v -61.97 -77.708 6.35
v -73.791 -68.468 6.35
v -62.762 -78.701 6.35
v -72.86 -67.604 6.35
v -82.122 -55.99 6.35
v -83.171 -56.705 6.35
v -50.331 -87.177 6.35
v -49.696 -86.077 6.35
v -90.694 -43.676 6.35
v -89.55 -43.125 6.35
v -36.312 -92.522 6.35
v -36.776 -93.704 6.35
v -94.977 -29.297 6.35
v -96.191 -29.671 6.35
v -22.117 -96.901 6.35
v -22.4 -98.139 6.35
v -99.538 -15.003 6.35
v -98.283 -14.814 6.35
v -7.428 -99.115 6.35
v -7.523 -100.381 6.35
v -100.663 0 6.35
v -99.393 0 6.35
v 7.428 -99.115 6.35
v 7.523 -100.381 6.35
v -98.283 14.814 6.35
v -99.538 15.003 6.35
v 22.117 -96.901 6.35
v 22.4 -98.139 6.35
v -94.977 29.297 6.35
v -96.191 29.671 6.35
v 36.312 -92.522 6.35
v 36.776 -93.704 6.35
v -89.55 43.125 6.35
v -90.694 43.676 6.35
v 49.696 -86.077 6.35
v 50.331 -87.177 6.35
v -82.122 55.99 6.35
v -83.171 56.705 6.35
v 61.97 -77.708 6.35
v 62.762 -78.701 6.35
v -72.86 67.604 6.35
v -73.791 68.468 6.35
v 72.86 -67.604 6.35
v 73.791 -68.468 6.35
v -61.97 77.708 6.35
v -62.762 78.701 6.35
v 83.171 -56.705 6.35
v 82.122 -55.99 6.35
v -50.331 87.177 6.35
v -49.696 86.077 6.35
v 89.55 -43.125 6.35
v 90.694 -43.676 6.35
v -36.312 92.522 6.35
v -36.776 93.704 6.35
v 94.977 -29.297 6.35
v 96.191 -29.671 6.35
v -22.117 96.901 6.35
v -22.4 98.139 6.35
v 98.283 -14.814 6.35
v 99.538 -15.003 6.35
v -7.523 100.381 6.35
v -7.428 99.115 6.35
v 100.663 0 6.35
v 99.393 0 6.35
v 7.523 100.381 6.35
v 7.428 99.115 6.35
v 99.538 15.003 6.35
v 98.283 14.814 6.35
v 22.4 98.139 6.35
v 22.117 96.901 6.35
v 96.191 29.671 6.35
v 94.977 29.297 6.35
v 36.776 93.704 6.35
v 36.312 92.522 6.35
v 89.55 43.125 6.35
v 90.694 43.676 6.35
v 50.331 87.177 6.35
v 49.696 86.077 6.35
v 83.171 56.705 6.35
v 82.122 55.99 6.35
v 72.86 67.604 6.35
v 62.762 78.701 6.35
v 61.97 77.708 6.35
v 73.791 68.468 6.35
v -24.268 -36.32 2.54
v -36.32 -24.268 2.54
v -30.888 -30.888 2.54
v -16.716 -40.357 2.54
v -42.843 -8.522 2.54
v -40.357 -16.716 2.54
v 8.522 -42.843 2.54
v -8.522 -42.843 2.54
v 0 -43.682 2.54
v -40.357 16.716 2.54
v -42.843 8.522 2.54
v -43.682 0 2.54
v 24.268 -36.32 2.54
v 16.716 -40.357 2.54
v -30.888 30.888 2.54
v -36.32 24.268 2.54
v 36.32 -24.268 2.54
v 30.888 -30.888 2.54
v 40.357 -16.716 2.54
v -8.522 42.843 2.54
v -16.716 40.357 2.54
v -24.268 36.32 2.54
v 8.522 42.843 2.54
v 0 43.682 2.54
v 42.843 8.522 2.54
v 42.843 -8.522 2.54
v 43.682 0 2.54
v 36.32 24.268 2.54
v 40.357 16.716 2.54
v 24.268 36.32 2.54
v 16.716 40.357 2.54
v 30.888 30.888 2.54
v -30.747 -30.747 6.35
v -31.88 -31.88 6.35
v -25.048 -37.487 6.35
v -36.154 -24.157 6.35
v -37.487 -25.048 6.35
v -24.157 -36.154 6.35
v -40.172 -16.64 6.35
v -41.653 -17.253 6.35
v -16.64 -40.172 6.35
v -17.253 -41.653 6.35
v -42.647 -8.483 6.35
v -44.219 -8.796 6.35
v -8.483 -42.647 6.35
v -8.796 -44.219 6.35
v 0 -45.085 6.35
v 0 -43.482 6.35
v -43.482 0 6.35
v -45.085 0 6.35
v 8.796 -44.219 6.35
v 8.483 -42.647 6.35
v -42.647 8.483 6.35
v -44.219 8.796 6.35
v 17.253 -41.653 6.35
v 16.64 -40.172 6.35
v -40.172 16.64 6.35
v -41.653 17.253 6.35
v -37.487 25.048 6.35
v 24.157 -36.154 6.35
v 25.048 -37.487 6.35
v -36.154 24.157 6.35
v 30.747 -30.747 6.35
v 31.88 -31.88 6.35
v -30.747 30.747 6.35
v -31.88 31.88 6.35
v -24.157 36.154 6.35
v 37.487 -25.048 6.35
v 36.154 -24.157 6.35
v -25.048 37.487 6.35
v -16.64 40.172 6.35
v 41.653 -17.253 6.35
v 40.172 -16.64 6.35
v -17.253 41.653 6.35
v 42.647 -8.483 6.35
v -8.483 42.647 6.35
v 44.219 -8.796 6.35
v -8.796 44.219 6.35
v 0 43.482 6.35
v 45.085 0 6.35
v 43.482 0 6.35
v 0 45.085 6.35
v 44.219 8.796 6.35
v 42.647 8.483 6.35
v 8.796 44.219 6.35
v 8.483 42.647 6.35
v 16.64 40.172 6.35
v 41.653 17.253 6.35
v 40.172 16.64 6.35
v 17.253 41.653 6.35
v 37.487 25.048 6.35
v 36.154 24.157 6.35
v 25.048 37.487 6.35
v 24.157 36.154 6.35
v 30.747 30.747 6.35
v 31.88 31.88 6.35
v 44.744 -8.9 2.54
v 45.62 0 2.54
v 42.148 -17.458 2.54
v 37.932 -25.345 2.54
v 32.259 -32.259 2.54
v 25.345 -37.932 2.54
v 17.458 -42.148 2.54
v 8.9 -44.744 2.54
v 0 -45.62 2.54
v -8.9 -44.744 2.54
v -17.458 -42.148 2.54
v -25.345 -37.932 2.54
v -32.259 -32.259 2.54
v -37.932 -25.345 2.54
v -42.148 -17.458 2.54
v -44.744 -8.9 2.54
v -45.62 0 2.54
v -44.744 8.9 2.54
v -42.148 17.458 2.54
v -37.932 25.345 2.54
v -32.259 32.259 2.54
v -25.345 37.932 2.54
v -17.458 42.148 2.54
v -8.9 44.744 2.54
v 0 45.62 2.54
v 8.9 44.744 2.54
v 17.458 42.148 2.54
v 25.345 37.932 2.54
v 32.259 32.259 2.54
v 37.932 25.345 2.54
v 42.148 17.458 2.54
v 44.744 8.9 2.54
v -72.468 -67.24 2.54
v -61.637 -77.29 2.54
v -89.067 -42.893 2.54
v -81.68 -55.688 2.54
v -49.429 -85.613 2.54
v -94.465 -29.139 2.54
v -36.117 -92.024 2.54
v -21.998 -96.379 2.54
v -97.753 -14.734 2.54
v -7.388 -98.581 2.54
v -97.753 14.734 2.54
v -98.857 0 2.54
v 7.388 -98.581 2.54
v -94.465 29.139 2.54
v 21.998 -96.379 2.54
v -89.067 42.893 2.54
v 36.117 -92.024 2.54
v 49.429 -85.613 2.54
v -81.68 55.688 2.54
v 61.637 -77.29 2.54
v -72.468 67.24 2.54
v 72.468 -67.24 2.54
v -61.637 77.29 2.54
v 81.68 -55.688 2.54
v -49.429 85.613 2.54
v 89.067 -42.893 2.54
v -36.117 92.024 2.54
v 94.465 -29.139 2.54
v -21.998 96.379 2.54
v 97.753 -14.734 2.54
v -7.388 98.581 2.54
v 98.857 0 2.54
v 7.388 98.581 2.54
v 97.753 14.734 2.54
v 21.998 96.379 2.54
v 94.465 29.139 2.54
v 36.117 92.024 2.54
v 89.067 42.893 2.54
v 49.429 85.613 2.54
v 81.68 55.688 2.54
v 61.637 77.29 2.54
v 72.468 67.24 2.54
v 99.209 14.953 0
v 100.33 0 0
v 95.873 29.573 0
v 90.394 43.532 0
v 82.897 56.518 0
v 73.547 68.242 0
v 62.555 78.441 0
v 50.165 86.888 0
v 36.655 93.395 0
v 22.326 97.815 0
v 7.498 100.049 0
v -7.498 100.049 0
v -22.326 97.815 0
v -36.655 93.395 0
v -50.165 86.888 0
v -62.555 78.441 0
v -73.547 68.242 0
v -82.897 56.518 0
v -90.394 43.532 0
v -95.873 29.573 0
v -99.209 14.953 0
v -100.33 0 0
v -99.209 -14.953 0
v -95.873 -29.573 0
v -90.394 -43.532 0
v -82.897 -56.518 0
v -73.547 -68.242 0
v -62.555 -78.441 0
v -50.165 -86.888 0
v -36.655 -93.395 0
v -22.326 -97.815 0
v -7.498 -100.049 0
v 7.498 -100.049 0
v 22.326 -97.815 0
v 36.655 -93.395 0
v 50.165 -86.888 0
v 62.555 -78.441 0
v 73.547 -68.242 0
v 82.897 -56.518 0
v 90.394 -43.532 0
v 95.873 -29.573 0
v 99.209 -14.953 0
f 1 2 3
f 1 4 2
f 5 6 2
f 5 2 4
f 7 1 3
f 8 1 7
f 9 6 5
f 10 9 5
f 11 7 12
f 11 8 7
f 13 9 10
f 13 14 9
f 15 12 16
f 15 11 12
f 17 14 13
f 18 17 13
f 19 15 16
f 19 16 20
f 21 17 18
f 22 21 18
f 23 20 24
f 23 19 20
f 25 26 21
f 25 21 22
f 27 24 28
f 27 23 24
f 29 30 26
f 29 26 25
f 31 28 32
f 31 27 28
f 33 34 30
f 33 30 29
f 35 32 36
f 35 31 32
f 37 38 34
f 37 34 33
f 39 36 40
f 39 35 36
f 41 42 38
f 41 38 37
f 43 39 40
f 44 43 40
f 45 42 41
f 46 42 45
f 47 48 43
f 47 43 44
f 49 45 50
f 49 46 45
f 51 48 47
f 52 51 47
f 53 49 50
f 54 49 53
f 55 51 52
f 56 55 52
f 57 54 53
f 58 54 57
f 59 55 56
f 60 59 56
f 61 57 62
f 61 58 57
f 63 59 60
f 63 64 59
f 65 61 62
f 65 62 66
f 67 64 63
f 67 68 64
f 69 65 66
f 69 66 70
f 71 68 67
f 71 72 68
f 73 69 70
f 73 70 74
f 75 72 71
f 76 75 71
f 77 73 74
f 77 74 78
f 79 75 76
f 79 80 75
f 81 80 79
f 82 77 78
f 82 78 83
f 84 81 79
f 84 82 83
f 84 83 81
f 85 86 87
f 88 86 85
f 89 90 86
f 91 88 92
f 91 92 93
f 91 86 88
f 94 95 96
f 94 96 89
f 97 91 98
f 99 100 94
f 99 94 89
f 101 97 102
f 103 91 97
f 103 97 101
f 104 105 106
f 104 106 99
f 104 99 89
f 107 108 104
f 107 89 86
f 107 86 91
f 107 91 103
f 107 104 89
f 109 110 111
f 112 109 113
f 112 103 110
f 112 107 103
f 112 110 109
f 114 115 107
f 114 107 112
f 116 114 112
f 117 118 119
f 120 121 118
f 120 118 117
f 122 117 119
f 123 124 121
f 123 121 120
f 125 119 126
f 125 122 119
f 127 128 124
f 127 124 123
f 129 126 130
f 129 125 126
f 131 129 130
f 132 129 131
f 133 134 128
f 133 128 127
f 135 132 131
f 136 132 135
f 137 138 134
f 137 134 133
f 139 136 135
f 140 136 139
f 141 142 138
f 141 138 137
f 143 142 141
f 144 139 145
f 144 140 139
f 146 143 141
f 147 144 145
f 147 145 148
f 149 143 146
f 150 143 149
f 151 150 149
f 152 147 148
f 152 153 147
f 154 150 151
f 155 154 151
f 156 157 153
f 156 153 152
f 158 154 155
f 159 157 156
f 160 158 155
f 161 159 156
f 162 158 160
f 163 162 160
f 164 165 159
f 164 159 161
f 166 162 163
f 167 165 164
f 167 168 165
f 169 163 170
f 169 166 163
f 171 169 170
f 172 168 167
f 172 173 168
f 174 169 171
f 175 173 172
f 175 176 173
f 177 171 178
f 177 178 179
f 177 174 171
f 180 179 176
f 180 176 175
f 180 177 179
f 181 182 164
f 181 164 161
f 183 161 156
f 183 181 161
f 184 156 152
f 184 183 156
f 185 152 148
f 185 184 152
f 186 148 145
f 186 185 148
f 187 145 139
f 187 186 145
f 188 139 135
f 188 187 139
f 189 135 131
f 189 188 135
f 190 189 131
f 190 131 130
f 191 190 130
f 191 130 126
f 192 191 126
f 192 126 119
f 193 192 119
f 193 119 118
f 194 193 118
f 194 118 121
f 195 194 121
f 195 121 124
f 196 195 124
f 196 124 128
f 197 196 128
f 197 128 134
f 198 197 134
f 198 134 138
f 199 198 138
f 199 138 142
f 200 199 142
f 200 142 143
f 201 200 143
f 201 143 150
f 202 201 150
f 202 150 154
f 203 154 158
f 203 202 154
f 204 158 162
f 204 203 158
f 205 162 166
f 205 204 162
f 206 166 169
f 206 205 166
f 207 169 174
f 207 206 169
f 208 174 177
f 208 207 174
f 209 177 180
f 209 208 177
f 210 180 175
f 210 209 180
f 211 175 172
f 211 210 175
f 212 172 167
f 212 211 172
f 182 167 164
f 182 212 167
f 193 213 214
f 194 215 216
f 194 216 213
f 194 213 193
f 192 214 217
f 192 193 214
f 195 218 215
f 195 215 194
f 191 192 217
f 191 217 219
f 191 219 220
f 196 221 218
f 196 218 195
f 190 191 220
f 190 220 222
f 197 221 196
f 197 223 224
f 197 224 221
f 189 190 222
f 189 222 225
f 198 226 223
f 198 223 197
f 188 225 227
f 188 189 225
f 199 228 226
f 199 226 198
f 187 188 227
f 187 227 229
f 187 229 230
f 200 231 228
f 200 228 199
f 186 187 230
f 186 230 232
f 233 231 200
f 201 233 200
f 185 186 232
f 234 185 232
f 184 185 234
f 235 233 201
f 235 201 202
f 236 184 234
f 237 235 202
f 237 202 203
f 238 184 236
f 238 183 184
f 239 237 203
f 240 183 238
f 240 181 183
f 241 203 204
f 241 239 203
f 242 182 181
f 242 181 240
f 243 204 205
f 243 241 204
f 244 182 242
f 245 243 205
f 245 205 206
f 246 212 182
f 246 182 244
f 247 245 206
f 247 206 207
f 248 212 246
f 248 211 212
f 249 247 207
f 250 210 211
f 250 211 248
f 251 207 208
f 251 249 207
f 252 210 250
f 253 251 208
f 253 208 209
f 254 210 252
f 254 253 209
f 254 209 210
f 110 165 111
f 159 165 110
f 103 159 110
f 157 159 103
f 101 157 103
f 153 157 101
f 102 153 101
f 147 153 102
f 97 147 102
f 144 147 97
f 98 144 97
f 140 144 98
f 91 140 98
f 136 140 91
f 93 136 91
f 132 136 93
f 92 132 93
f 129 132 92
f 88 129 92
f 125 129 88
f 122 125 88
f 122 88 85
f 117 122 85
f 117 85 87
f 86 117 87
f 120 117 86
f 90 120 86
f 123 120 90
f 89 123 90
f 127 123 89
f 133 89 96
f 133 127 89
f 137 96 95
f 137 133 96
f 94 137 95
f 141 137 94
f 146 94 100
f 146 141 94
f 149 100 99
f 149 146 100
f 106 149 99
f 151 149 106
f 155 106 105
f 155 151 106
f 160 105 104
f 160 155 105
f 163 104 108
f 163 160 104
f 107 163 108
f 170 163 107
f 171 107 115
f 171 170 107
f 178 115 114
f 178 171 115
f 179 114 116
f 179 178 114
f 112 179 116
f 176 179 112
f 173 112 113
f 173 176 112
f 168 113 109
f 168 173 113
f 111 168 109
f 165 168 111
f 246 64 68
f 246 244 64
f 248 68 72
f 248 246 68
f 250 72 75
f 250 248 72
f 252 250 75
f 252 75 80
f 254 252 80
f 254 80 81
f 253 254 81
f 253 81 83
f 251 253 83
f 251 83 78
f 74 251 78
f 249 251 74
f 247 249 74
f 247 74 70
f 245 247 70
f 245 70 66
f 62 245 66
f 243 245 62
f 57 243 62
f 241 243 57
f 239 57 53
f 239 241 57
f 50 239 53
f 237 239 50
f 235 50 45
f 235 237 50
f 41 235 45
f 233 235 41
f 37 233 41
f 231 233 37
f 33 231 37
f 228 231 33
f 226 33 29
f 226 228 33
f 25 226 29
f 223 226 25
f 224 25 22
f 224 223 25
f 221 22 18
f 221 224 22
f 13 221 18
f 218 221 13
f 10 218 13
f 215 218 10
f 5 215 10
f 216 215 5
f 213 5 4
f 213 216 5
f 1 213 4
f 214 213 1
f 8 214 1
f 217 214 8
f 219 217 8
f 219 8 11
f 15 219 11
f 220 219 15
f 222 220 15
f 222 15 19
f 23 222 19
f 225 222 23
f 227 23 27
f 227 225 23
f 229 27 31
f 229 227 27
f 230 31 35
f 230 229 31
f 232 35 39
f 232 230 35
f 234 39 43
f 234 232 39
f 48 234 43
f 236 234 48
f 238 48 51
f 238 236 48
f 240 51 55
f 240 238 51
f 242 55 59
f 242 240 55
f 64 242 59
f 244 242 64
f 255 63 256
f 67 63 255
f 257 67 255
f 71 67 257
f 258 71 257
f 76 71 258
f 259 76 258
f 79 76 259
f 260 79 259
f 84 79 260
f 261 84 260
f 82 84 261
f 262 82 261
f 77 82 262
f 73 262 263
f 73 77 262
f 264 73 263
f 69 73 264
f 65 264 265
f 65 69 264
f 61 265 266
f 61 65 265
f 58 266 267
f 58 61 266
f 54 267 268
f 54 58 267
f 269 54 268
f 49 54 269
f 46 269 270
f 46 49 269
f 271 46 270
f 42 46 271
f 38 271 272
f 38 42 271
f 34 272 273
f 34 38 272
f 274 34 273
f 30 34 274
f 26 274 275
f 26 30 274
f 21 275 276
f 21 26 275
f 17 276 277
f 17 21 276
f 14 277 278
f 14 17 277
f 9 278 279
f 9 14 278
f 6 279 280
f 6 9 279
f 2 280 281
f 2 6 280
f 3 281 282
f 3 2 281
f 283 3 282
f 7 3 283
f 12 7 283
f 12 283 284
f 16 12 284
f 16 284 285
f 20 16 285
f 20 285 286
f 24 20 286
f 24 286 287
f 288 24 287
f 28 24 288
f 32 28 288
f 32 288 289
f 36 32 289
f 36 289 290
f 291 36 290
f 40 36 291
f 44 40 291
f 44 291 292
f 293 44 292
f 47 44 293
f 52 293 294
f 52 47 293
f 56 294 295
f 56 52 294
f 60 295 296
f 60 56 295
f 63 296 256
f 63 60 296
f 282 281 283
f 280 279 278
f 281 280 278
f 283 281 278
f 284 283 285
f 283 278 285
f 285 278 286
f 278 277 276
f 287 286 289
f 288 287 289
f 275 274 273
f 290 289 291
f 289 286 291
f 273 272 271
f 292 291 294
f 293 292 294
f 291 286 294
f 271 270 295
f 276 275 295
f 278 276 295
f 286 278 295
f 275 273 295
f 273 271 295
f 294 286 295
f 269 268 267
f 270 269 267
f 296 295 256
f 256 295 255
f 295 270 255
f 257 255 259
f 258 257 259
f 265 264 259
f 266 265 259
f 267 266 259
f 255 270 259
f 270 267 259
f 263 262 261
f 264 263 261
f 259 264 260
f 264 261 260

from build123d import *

# Parameters (mm, degrees)
F0_R     = 100.33
F0_R_2   = 43.815
F1_DEPTH = 6.35
F1_TAPER = -3
F2_DEPTH = 2.54
F3_R     = 43.4822106016
F4_DEPTH = 3.81
F3_R_2   = 99.3927893984
F3_R_3   = 45.085
F5_DEPTH = 3.81
F5_TAPER = 8


with BuildPart() as f1:
    # F0 (on Top) → F1 (new body)
    with BuildSketch(Plane.XY):
        Circle(F0_R)
        Circle(F0_R_2, mode=Mode.SUBTRACT)
    extrude(amount=F1_DEPTH, taper=F1_TAPER)

    # F0 (on Top) → F2 (join)
    with BuildSketch(Plane.XY):
        Circle(F0_R_2)
    extrude(amount=F2_DEPTH)

    # F3 (on face) → F4 (cut, through all)
    with BuildSketch(Plane.XY.offset(6.35)):
        Circle(F3_R)
    extrude(amount=-F4_DEPTH, mode=Mode.SUBTRACT)

    # F3 (on face) → F5 (cut, through all)
    with BuildSketch(Plane.XY.offset(6.35)):
        Circle(F3_R_2)
        Circle(F3_R_3, mode=Mode.SUBTRACT)
    extrude(amount=-F5_DEPTH, taper=F5_TAPER, mode=Mode.SUBTRACT)


solid = f1.part
